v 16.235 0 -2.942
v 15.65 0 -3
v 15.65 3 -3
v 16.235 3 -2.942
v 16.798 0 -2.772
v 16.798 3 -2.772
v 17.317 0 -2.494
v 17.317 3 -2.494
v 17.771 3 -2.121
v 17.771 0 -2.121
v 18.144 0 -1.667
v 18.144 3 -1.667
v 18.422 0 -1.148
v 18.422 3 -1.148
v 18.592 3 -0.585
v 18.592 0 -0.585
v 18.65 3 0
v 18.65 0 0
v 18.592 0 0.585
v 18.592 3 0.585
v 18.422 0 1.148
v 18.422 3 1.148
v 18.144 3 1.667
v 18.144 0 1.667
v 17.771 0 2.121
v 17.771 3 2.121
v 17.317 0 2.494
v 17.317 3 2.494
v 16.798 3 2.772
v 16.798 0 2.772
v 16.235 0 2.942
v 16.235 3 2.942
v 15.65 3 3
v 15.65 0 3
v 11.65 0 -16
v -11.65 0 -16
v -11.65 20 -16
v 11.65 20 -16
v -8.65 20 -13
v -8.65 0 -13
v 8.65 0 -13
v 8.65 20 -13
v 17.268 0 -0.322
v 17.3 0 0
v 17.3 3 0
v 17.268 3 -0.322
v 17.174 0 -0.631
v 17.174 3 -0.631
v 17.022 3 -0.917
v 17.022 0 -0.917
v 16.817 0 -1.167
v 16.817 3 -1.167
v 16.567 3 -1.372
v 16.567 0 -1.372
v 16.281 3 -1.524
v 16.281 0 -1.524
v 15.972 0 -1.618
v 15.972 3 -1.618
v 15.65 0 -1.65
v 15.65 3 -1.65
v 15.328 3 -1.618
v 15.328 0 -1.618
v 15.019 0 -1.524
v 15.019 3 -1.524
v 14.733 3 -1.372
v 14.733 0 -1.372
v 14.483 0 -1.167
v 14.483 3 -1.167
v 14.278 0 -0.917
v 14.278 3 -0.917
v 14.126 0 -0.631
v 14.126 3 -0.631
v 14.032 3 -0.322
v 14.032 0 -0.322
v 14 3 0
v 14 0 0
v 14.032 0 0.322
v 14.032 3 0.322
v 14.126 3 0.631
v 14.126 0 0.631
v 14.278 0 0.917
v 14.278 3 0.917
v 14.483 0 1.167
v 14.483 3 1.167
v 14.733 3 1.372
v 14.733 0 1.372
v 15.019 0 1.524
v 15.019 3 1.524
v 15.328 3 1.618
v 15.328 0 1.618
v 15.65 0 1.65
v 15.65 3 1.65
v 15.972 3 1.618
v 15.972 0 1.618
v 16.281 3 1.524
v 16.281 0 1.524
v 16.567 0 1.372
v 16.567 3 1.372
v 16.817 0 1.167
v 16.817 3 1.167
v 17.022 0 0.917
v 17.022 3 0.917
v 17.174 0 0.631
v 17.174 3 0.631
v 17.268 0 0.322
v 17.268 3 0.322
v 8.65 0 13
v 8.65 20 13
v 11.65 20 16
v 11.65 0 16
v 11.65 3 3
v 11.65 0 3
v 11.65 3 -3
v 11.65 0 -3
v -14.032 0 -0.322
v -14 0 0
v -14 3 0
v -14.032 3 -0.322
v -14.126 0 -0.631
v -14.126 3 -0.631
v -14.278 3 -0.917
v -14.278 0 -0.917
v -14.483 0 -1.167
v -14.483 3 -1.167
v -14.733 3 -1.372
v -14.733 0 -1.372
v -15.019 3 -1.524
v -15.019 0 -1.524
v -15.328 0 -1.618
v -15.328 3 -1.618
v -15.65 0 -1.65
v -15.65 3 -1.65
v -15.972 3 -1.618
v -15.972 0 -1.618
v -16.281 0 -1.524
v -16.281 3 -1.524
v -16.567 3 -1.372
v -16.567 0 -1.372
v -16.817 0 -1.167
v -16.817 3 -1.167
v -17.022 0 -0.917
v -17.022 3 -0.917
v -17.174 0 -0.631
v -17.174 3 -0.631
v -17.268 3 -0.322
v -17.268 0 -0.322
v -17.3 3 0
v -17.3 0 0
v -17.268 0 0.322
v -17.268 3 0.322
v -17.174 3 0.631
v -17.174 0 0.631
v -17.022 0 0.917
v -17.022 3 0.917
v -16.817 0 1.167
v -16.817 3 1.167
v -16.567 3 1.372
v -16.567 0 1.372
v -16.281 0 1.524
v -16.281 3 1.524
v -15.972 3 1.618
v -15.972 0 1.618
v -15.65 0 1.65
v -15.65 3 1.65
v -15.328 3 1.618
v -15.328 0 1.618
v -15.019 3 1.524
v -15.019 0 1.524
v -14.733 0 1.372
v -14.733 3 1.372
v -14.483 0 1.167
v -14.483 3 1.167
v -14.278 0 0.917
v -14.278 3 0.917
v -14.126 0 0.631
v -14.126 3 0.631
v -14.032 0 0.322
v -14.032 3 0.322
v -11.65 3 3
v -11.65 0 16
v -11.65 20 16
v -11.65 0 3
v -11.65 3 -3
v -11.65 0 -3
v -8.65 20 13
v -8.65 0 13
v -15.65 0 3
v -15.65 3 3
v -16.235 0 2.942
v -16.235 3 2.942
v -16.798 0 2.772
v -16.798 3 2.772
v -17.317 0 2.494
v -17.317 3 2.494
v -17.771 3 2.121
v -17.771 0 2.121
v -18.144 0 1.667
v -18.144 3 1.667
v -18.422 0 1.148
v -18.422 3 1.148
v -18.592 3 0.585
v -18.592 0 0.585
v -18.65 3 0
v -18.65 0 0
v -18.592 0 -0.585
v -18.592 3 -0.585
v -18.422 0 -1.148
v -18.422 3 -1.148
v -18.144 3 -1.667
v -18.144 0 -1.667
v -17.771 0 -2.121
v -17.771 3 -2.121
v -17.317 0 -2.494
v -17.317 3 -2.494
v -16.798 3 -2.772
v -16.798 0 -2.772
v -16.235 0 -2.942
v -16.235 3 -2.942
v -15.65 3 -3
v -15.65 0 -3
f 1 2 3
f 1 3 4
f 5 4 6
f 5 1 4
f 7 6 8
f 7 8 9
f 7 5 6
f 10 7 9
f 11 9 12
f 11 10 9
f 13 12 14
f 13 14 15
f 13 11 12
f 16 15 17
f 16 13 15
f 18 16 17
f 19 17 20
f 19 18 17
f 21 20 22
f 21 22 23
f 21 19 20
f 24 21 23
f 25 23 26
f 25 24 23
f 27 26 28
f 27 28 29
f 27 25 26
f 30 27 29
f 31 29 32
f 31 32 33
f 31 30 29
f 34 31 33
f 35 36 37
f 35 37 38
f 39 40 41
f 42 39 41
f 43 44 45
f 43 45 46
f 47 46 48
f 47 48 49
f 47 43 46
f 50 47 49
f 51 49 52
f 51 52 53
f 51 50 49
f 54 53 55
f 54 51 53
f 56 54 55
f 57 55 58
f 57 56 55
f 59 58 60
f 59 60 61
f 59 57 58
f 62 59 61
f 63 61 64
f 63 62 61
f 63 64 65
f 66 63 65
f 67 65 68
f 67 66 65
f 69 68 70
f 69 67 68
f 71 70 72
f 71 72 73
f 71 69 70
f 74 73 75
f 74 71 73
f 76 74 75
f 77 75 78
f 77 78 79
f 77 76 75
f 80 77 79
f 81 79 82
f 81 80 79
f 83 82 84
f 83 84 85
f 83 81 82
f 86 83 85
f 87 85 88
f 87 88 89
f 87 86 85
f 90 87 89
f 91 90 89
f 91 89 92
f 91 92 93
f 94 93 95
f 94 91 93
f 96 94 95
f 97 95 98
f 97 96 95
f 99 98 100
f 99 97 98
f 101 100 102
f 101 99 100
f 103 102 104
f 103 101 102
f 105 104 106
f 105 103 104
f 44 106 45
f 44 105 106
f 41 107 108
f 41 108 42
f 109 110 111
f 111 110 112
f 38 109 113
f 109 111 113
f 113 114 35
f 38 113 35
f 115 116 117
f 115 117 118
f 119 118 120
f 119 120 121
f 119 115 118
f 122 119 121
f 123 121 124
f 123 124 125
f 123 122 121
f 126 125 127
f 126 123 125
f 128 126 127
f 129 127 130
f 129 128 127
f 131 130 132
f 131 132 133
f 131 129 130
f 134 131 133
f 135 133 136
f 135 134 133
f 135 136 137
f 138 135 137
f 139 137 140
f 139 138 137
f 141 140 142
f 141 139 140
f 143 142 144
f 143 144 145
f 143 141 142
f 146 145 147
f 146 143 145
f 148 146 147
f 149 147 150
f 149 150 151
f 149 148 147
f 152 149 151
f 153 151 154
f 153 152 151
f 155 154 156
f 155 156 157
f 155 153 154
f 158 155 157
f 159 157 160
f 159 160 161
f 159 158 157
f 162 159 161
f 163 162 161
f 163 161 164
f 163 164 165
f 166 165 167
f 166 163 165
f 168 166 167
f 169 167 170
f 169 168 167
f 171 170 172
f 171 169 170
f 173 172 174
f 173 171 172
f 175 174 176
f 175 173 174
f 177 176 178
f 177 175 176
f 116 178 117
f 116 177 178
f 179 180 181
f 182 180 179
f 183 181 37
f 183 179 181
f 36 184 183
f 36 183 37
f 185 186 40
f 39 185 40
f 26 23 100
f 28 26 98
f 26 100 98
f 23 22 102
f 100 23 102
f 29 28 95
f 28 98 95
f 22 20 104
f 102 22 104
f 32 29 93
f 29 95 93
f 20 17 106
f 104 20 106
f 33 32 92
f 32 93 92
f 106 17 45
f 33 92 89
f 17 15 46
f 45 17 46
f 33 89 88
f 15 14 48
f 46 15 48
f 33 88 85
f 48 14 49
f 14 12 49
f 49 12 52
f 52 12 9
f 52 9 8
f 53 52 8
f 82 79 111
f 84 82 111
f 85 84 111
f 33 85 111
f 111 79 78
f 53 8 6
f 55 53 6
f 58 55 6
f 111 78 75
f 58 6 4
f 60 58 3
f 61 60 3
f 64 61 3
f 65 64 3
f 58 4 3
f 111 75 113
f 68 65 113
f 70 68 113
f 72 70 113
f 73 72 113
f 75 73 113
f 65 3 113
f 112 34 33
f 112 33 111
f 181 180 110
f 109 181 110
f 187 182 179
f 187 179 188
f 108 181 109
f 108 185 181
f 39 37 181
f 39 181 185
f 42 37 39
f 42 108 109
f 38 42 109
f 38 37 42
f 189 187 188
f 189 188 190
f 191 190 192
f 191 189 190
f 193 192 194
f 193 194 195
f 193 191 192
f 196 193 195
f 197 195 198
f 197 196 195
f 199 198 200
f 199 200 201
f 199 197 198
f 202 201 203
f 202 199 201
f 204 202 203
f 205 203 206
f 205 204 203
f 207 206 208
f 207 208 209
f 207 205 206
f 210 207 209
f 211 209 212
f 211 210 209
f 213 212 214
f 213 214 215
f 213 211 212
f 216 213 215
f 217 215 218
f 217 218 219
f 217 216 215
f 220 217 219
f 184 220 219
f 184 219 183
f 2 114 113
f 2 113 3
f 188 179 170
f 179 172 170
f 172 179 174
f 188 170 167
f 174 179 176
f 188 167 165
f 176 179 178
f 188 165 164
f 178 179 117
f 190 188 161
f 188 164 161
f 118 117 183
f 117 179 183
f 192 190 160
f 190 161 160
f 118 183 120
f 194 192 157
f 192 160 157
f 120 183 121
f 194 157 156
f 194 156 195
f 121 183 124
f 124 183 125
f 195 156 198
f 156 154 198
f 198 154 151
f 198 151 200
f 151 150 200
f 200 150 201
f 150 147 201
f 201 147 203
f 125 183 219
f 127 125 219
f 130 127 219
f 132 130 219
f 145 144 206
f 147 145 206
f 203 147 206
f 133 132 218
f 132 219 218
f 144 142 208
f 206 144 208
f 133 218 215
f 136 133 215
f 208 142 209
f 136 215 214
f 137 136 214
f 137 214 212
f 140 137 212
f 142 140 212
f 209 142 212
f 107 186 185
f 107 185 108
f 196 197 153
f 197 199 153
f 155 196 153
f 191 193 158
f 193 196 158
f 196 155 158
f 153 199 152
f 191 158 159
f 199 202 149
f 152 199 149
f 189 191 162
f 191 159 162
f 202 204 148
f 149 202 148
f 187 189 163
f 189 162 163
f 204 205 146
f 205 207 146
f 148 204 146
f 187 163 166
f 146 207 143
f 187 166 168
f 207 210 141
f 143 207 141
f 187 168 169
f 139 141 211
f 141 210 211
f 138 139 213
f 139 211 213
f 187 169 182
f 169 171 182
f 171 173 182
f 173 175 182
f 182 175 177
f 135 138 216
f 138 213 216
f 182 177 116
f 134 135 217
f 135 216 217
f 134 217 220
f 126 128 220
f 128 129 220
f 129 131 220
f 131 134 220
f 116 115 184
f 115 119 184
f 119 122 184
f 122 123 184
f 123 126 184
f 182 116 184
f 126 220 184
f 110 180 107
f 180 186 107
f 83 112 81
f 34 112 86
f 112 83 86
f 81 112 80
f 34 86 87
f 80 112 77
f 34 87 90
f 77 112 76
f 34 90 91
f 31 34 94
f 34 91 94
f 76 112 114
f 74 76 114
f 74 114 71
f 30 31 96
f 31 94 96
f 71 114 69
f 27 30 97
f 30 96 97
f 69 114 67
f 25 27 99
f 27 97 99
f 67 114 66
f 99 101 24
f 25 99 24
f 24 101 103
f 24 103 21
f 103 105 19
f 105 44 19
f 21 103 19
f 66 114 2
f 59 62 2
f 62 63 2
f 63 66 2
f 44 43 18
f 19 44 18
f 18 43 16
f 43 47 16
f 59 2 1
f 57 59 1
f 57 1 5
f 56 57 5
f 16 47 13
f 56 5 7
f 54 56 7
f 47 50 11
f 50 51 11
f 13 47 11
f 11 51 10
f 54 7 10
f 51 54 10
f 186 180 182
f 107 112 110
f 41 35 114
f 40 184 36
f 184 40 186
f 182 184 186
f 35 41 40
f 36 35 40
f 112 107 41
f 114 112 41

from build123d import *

# Parameters (mm, degrees)
SKETCH1_W           = 23.3
SKETCH1_H           = 32
SKETCH1_W_2         = 17.3
SKETCH1_H_2         = 26
BOSS_EXTRUDE1_DEPTH = 20
SKETCH3_R           = 1.65
BOSS_EXTRUDE2_DEPTH = 3


with BuildPart() as part:
    # Sketch1 → Boss-Extrude1 (new body)
    with BuildSketch(Plane(origin=(0, 0, 0), x_dir=(1, 0, 0), z_dir=(0, 1, 0))):
        Rectangle(SKETCH1_W, SKETCH1_H)
        Rectangle(SKETCH1_W_2, SKETCH1_H_2, mode=Mode.SUBTRACT)
    extrude(amount=BOSS_EXTRUDE1_DEPTH)

    # Sketch3 → Boss-Extrude2 (add)
    with BuildSketch(Plane(origin=(0, 0, 0), x_dir=(1, 0, 0), z_dir=(0, 1, 0))):
        with BuildLine():
            Line((11.65, 3), (15.65, 3))
            ThreePointArc((15.65, 3), (18.65, 0), (15.65, -3))
            Line((15.65, -3), (11.65, -3))
            Line((11.65, -3), (11.65, 3))
        make_face()
        with Locations((15.65, 0)):
            Circle(SKETCH3_R, mode=Mode.SUBTRACT)
        with BuildLine():
            Line((-11.65, -3), (-15.65, -3))
            ThreePointArc((-15.65, -3), (-18.65, 0), (-15.65, 3))
            Line((-15.65, 3), (-11.65, 3))
            Line((-11.65, 3), (-11.65, -3))
        make_face()
        with Locations((-15.65, 0)):
            Circle(SKETCH3_R, mode=Mode.SUBTRACT)
    extrude(amount=BOSS_EXTRUDE2_DEPTH)


solid = part.part
